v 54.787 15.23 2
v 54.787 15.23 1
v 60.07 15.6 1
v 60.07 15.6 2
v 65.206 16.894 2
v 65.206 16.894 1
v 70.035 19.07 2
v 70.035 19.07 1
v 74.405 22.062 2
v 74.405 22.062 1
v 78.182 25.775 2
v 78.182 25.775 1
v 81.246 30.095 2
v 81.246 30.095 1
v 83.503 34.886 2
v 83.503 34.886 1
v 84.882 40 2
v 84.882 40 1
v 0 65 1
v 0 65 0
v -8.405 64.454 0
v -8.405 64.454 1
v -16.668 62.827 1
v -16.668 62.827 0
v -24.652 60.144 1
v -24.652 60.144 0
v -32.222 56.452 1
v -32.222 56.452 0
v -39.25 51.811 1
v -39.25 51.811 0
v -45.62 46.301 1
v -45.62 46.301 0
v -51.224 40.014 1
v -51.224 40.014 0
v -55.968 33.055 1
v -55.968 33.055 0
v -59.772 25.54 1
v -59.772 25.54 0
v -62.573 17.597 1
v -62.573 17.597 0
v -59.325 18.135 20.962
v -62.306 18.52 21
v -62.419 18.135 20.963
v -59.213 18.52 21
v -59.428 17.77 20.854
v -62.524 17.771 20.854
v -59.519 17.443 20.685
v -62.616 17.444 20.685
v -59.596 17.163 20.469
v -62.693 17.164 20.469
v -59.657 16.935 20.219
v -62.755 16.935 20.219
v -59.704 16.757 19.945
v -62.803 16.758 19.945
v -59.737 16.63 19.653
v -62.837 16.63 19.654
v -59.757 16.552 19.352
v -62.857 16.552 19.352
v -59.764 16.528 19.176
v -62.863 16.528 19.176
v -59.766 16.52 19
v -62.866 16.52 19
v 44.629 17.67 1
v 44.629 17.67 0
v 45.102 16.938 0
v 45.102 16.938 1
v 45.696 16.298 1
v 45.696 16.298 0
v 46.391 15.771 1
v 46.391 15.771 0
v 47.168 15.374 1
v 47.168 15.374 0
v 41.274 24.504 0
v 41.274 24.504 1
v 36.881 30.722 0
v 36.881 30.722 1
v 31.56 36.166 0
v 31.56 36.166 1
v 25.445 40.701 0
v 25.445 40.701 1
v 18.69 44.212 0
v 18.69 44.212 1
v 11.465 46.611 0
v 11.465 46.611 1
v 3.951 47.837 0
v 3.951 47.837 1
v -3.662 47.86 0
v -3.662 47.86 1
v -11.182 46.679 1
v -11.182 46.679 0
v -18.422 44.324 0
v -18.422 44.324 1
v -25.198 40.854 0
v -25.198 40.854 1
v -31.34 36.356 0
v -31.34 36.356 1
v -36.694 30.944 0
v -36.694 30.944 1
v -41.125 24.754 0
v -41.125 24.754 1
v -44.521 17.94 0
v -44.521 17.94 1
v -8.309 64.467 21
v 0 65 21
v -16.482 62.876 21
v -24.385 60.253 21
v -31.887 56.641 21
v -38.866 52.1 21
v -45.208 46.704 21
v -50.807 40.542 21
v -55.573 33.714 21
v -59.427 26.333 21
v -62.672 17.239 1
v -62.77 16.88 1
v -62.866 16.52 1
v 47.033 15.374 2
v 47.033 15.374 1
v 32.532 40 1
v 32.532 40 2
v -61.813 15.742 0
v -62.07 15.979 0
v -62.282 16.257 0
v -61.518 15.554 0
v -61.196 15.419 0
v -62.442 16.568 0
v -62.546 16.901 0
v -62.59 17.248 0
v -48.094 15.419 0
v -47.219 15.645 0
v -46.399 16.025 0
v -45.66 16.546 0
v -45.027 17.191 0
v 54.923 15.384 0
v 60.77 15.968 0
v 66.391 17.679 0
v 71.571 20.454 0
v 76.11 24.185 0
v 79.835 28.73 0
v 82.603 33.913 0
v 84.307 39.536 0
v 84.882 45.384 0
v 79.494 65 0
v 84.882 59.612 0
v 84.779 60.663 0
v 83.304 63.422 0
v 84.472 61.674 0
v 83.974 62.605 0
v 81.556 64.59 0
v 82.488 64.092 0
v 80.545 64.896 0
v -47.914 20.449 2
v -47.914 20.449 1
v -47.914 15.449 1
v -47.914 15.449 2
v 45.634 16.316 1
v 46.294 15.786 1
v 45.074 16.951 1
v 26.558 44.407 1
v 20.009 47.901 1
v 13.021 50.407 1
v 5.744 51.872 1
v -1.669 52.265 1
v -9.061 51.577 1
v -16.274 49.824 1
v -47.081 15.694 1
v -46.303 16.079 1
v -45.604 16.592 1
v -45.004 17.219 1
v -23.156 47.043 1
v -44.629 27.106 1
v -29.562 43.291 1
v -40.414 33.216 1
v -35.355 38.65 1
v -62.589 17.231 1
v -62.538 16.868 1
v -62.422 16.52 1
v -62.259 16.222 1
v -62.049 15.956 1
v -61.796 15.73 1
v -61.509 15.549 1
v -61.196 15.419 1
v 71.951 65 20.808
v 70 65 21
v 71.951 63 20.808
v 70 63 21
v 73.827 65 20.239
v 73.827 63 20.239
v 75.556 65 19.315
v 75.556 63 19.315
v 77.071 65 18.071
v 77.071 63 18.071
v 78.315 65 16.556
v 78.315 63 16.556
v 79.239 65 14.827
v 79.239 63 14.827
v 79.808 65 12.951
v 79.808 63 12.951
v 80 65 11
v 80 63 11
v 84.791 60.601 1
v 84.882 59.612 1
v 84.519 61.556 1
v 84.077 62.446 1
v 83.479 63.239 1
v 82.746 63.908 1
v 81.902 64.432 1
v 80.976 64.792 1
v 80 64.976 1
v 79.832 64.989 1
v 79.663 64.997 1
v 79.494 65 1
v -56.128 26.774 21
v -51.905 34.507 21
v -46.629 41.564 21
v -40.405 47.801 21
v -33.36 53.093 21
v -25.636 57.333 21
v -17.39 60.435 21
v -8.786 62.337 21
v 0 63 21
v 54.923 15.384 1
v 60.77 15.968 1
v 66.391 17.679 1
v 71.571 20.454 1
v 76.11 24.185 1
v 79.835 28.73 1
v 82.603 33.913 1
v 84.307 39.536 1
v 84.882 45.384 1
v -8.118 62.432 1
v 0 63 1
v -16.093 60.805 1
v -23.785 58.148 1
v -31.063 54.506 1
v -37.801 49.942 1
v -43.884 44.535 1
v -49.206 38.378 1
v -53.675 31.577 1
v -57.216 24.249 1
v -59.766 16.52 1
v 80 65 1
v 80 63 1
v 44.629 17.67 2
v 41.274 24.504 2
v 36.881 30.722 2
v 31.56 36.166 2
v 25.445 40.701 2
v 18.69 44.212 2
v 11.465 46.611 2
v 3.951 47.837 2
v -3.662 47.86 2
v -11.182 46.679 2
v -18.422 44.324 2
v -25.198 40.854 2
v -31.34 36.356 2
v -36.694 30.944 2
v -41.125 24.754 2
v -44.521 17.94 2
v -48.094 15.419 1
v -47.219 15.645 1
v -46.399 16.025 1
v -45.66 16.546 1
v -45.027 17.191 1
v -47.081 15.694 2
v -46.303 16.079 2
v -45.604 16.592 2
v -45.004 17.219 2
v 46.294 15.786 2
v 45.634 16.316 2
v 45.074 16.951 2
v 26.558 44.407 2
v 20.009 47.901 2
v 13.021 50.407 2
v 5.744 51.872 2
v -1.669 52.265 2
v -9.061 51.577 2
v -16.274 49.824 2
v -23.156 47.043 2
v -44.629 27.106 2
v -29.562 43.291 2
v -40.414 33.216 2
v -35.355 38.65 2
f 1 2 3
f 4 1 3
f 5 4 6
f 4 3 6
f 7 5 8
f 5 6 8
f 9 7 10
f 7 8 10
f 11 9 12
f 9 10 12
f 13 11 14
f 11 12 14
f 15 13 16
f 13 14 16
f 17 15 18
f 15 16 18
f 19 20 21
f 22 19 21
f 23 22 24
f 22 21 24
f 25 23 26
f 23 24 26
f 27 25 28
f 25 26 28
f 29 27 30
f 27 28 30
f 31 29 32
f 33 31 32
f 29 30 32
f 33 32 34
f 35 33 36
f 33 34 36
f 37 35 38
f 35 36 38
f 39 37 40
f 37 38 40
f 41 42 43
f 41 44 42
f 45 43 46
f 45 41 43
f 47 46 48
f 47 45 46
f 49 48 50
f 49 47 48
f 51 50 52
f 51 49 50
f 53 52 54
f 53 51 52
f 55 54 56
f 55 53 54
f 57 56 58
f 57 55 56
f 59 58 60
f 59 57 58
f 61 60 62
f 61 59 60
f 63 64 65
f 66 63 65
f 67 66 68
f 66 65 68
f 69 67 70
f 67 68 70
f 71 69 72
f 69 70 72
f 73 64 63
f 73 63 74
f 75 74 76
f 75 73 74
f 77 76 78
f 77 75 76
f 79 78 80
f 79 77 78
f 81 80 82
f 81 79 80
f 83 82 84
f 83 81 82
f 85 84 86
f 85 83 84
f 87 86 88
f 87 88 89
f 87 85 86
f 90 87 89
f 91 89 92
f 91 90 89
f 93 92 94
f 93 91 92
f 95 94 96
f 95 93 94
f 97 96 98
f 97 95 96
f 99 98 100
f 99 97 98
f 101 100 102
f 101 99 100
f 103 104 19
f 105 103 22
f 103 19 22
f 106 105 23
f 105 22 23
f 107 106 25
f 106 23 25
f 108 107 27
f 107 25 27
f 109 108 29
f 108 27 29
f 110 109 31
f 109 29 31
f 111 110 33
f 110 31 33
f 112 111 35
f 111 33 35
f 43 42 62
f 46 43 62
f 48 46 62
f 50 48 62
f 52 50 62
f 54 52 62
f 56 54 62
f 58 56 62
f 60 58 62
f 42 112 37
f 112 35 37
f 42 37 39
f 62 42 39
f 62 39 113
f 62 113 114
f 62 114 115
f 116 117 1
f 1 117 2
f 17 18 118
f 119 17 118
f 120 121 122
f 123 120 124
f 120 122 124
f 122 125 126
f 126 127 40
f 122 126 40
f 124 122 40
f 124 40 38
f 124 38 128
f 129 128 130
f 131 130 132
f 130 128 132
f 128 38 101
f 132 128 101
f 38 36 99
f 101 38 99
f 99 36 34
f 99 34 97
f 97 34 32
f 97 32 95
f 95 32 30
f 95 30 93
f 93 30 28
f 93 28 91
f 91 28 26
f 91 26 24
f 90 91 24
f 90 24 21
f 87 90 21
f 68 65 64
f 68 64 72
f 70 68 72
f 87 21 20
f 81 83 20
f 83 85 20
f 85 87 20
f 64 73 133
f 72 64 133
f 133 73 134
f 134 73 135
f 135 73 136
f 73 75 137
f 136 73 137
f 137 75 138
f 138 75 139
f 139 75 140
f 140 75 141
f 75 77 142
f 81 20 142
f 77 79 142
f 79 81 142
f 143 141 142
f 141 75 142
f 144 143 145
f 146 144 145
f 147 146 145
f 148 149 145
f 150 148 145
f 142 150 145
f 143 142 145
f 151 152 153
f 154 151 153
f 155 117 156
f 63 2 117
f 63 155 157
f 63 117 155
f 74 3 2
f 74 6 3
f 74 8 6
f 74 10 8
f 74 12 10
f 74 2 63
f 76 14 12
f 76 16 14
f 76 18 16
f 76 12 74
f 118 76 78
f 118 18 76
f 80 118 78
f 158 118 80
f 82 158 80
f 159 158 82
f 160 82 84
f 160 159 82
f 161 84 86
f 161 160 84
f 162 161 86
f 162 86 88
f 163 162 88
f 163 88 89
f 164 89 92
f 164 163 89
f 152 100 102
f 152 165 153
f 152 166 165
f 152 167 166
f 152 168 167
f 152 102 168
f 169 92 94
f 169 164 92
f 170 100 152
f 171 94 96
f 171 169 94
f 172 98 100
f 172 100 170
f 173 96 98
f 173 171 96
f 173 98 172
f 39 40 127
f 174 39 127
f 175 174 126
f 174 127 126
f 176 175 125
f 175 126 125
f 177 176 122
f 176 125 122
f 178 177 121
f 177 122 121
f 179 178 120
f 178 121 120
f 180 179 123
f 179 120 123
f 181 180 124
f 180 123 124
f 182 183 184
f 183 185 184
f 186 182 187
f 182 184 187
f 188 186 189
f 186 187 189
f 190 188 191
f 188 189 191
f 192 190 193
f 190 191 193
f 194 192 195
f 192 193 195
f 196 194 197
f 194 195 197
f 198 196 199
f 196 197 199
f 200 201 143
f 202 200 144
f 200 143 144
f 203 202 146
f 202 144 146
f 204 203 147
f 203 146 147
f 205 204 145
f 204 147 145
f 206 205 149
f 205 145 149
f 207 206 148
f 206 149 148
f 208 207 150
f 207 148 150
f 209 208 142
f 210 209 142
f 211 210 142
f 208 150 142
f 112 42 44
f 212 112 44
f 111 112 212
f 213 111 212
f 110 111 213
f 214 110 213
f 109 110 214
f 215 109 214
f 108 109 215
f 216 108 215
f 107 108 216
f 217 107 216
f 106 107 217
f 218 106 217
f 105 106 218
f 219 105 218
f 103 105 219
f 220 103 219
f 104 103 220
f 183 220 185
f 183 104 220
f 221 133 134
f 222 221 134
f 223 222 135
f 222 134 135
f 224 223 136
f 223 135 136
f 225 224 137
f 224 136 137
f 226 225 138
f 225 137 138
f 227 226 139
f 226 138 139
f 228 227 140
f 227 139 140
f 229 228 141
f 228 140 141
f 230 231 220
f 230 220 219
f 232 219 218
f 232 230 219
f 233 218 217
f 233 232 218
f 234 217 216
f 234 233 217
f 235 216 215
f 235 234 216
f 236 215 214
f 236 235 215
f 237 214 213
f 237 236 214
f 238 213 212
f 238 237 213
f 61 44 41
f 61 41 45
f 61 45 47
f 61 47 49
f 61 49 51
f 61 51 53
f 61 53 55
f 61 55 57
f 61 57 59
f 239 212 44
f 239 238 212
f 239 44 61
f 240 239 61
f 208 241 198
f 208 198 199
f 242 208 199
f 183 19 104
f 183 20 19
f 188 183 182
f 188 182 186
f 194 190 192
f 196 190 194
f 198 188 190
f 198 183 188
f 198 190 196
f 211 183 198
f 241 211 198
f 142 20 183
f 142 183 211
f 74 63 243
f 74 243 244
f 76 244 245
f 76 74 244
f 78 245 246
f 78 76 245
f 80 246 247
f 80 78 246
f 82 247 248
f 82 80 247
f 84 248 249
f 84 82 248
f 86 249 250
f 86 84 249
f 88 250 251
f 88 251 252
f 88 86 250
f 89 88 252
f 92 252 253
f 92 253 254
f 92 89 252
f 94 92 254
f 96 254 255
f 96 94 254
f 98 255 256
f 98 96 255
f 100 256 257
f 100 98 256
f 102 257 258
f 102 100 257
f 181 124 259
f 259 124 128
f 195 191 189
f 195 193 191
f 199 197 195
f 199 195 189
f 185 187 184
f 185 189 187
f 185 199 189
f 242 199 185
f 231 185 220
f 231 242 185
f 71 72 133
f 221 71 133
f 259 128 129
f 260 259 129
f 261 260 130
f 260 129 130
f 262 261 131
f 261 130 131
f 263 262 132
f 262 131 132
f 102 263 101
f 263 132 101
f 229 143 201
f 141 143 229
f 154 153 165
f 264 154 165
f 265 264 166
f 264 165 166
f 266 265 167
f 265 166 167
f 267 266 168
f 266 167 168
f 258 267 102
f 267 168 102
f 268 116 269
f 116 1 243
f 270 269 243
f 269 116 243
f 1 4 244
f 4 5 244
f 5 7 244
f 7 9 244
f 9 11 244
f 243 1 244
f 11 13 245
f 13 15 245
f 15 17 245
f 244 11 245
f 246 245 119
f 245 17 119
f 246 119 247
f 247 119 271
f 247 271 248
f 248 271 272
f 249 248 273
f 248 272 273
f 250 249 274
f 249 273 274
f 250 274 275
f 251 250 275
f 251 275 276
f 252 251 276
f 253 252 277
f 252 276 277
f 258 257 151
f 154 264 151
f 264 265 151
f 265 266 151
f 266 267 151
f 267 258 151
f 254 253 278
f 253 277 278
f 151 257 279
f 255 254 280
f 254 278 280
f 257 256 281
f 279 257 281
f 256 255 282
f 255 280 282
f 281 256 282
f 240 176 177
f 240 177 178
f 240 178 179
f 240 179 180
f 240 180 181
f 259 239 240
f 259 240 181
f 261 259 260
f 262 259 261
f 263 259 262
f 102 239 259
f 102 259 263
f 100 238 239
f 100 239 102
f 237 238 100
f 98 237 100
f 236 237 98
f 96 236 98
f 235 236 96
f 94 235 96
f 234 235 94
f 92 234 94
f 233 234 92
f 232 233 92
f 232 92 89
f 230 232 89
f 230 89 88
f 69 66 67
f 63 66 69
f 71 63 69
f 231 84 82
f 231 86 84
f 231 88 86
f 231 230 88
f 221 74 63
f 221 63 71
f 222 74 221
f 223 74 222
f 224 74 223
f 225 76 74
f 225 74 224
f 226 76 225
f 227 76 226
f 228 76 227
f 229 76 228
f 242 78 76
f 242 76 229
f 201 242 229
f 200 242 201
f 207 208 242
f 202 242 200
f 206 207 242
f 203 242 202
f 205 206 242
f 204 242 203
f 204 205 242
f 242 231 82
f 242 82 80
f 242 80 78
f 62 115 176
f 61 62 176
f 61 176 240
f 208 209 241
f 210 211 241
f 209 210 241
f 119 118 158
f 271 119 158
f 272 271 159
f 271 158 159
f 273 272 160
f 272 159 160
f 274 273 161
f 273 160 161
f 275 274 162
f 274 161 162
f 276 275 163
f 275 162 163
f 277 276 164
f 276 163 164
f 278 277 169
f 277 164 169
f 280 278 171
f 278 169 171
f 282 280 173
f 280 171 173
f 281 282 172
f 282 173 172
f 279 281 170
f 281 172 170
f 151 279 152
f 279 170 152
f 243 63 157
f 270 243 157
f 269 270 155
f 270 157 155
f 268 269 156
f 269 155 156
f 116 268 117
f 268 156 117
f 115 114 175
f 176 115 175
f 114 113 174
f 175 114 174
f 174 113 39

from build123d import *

# Parameters (mm, degrees)
PAD002_DEPTH = 1
PAD_DEPTH    = 1
PAD004_DEPTH = 20
FILLET_R     = 10
FILLET001_R  = 2


with BuildPart() as stiffener:
    # Sketch002 → Pad002 (new body)
    with BuildSketch(Plane.XY.offset(1)):
        with BuildLine():
            ThreePointArc((44.629065, 17.6705), (0.14521, 47.99978), (-44.521334, 17.9402))
            ThreePointArc((-47.9135, 15.4491), (-45.942552, 16.320362), (-44.521334, 17.9402))
            Line((-47.9135, 20.4491), (-47.9135, 15.4491))
            ThreePointArc((32.5316, 40), (-12.69933, 50.832278), (-47.9135, 20.4491))
            Line((84.8825, 40), (32.5316, 40))
            ThreePointArc((54.786712, 15.2303), (74.405353, 22.061582), (84.8825, 40))
            Line((47.032776, 15.3736), (54.786712, 15.2303))
            ThreePointArc((44.629065, 17.6705), (45.634419, 16.316411), (47.032776, 15.3736))
        make_face()
    extrude(amount=PAD002_DEPTH)


with BuildPart() as fillet001:
    # Sketch → Pad (new body)
    with BuildSketch(Plane.XY):
        with BuildLine():
            ThreePointArc((0, 65), (-39.250322, 51.811314), (-62.572638, 17.5973))
            ThreePointArc((-62.572638, 17.5973), (-62.281657, 16.256919), (-61.1956, 15.4192))
            Line((-61.1956, 15.4192), (-48.0942, 15.4192))
            ThreePointArc((-48.0942, 15.4192), (-46.017568, 16.268418), (-44.521334, 17.9402))
            ThreePointArc((44.629065, 17.6705), (0.14521, 47.99978), (-44.521334, 17.9402))
            ThreePointArc((44.629065, 17.6705), (45.695788, 16.297968), (47.167959, 15.3736))
            Line((47.167959, 15.3736), (54.923211, 15.384158))
            ThreePointArc((54.923211, 15.384158), (76.110008, 24.185371), (84.88237, 45.38413))
            Line((84.88237, 59.61183), (84.88237, 45.38413))
            ThreePointArc((84.88237, 59.61183), (83.304212, 63.421842), (79.4942, 65))
            Line((0, 65), (79.4942, 65))
        make_face()
    extrude(amount=PAD_DEPTH)

    # Sketch001 → Pad004 (new body)
    with BuildSketch(Plane.XY.offset(1)):
        with BuildLine():
            ThreePointArc((6e-05, 65), (-39.693641, 51.472467), (-62.865542, 16.5204))
            Line((-62.865542, 16.5204), (-59.765542, 16.5204))
            ThreePointArc((6e-05, 63), (-37.80132, 49.942273), (-59.765542, 16.5204))
            Line((80.00006, 63), (6e-05, 63))
            Line((80.00006, 65), (80.00006, 63))
            Line((6e-05, 65), (80.00006, 65))
        make_face()
    extrude(amount=PAD004_DEPTH)

    # Fillet
    fillet_edges = [fillet001.edges().sort_by_distance(p)[0] for p in [
        (80.00006, 64, 21),
    ]]
    fillet(fillet_edges, radius=FILLET_R)

    # Fillet001
    fillet001_edges = [fillet001.edges().sort_by_distance(p)[0] for p in [
        (-61.315542, 16.5204, 21),
    ]]
    fillet(fillet001_edges, radius=FILLET001_R)


solid = Compound([stiffener.part, fillet001.part])
